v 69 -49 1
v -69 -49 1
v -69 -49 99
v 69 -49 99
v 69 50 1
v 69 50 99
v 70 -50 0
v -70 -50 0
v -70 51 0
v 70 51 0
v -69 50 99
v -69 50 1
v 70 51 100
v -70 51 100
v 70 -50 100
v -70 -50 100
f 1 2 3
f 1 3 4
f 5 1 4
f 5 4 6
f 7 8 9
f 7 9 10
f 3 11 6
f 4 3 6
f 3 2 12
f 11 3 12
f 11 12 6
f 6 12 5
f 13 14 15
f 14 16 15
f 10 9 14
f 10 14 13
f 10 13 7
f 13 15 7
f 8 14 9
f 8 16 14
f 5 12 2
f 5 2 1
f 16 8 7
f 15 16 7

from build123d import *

# Parameters (mm, degrees)
SKETCH1_W           = 140
SKETCH1_H           = 100
BOSS_EXTRUDE1_DEPTH = 100
SHELL1_T            = -1
SKETCH2_W           = 140
SKETCH2_H           = 100
BOSS_EXTRUDE2_DEPTH = 1


with BuildPart() as part:
    # Sketch1 → Boss-Extrude1 (new body)
    with BuildSketch(Plane.XY):
        Rectangle(SKETCH1_W, SKETCH1_H)
    extrude(amount=BOSS_EXTRUDE1_DEPTH)

    # Shell1
    shell1_openings = [part.faces().sort_by_distance(p)[0] for p in [
        (0, 50, 50),
    ]]
    offset(amount=SHELL1_T, openings=shell1_openings, kind=Kind.INTERSECTION)

    # Sketch2 → Boss-Extrude2 (add)
    with BuildSketch(Plane(origin=(0, 50, 0), x_dir=(1, 0, 0), z_dir=(0, 1, 0))):
        with Locations((0, -50)):
            Rectangle(SKETCH2_W, SKETCH2_H)
    extrude(amount=BOSS_EXTRUDE2_DEPTH)


solid = part.part
